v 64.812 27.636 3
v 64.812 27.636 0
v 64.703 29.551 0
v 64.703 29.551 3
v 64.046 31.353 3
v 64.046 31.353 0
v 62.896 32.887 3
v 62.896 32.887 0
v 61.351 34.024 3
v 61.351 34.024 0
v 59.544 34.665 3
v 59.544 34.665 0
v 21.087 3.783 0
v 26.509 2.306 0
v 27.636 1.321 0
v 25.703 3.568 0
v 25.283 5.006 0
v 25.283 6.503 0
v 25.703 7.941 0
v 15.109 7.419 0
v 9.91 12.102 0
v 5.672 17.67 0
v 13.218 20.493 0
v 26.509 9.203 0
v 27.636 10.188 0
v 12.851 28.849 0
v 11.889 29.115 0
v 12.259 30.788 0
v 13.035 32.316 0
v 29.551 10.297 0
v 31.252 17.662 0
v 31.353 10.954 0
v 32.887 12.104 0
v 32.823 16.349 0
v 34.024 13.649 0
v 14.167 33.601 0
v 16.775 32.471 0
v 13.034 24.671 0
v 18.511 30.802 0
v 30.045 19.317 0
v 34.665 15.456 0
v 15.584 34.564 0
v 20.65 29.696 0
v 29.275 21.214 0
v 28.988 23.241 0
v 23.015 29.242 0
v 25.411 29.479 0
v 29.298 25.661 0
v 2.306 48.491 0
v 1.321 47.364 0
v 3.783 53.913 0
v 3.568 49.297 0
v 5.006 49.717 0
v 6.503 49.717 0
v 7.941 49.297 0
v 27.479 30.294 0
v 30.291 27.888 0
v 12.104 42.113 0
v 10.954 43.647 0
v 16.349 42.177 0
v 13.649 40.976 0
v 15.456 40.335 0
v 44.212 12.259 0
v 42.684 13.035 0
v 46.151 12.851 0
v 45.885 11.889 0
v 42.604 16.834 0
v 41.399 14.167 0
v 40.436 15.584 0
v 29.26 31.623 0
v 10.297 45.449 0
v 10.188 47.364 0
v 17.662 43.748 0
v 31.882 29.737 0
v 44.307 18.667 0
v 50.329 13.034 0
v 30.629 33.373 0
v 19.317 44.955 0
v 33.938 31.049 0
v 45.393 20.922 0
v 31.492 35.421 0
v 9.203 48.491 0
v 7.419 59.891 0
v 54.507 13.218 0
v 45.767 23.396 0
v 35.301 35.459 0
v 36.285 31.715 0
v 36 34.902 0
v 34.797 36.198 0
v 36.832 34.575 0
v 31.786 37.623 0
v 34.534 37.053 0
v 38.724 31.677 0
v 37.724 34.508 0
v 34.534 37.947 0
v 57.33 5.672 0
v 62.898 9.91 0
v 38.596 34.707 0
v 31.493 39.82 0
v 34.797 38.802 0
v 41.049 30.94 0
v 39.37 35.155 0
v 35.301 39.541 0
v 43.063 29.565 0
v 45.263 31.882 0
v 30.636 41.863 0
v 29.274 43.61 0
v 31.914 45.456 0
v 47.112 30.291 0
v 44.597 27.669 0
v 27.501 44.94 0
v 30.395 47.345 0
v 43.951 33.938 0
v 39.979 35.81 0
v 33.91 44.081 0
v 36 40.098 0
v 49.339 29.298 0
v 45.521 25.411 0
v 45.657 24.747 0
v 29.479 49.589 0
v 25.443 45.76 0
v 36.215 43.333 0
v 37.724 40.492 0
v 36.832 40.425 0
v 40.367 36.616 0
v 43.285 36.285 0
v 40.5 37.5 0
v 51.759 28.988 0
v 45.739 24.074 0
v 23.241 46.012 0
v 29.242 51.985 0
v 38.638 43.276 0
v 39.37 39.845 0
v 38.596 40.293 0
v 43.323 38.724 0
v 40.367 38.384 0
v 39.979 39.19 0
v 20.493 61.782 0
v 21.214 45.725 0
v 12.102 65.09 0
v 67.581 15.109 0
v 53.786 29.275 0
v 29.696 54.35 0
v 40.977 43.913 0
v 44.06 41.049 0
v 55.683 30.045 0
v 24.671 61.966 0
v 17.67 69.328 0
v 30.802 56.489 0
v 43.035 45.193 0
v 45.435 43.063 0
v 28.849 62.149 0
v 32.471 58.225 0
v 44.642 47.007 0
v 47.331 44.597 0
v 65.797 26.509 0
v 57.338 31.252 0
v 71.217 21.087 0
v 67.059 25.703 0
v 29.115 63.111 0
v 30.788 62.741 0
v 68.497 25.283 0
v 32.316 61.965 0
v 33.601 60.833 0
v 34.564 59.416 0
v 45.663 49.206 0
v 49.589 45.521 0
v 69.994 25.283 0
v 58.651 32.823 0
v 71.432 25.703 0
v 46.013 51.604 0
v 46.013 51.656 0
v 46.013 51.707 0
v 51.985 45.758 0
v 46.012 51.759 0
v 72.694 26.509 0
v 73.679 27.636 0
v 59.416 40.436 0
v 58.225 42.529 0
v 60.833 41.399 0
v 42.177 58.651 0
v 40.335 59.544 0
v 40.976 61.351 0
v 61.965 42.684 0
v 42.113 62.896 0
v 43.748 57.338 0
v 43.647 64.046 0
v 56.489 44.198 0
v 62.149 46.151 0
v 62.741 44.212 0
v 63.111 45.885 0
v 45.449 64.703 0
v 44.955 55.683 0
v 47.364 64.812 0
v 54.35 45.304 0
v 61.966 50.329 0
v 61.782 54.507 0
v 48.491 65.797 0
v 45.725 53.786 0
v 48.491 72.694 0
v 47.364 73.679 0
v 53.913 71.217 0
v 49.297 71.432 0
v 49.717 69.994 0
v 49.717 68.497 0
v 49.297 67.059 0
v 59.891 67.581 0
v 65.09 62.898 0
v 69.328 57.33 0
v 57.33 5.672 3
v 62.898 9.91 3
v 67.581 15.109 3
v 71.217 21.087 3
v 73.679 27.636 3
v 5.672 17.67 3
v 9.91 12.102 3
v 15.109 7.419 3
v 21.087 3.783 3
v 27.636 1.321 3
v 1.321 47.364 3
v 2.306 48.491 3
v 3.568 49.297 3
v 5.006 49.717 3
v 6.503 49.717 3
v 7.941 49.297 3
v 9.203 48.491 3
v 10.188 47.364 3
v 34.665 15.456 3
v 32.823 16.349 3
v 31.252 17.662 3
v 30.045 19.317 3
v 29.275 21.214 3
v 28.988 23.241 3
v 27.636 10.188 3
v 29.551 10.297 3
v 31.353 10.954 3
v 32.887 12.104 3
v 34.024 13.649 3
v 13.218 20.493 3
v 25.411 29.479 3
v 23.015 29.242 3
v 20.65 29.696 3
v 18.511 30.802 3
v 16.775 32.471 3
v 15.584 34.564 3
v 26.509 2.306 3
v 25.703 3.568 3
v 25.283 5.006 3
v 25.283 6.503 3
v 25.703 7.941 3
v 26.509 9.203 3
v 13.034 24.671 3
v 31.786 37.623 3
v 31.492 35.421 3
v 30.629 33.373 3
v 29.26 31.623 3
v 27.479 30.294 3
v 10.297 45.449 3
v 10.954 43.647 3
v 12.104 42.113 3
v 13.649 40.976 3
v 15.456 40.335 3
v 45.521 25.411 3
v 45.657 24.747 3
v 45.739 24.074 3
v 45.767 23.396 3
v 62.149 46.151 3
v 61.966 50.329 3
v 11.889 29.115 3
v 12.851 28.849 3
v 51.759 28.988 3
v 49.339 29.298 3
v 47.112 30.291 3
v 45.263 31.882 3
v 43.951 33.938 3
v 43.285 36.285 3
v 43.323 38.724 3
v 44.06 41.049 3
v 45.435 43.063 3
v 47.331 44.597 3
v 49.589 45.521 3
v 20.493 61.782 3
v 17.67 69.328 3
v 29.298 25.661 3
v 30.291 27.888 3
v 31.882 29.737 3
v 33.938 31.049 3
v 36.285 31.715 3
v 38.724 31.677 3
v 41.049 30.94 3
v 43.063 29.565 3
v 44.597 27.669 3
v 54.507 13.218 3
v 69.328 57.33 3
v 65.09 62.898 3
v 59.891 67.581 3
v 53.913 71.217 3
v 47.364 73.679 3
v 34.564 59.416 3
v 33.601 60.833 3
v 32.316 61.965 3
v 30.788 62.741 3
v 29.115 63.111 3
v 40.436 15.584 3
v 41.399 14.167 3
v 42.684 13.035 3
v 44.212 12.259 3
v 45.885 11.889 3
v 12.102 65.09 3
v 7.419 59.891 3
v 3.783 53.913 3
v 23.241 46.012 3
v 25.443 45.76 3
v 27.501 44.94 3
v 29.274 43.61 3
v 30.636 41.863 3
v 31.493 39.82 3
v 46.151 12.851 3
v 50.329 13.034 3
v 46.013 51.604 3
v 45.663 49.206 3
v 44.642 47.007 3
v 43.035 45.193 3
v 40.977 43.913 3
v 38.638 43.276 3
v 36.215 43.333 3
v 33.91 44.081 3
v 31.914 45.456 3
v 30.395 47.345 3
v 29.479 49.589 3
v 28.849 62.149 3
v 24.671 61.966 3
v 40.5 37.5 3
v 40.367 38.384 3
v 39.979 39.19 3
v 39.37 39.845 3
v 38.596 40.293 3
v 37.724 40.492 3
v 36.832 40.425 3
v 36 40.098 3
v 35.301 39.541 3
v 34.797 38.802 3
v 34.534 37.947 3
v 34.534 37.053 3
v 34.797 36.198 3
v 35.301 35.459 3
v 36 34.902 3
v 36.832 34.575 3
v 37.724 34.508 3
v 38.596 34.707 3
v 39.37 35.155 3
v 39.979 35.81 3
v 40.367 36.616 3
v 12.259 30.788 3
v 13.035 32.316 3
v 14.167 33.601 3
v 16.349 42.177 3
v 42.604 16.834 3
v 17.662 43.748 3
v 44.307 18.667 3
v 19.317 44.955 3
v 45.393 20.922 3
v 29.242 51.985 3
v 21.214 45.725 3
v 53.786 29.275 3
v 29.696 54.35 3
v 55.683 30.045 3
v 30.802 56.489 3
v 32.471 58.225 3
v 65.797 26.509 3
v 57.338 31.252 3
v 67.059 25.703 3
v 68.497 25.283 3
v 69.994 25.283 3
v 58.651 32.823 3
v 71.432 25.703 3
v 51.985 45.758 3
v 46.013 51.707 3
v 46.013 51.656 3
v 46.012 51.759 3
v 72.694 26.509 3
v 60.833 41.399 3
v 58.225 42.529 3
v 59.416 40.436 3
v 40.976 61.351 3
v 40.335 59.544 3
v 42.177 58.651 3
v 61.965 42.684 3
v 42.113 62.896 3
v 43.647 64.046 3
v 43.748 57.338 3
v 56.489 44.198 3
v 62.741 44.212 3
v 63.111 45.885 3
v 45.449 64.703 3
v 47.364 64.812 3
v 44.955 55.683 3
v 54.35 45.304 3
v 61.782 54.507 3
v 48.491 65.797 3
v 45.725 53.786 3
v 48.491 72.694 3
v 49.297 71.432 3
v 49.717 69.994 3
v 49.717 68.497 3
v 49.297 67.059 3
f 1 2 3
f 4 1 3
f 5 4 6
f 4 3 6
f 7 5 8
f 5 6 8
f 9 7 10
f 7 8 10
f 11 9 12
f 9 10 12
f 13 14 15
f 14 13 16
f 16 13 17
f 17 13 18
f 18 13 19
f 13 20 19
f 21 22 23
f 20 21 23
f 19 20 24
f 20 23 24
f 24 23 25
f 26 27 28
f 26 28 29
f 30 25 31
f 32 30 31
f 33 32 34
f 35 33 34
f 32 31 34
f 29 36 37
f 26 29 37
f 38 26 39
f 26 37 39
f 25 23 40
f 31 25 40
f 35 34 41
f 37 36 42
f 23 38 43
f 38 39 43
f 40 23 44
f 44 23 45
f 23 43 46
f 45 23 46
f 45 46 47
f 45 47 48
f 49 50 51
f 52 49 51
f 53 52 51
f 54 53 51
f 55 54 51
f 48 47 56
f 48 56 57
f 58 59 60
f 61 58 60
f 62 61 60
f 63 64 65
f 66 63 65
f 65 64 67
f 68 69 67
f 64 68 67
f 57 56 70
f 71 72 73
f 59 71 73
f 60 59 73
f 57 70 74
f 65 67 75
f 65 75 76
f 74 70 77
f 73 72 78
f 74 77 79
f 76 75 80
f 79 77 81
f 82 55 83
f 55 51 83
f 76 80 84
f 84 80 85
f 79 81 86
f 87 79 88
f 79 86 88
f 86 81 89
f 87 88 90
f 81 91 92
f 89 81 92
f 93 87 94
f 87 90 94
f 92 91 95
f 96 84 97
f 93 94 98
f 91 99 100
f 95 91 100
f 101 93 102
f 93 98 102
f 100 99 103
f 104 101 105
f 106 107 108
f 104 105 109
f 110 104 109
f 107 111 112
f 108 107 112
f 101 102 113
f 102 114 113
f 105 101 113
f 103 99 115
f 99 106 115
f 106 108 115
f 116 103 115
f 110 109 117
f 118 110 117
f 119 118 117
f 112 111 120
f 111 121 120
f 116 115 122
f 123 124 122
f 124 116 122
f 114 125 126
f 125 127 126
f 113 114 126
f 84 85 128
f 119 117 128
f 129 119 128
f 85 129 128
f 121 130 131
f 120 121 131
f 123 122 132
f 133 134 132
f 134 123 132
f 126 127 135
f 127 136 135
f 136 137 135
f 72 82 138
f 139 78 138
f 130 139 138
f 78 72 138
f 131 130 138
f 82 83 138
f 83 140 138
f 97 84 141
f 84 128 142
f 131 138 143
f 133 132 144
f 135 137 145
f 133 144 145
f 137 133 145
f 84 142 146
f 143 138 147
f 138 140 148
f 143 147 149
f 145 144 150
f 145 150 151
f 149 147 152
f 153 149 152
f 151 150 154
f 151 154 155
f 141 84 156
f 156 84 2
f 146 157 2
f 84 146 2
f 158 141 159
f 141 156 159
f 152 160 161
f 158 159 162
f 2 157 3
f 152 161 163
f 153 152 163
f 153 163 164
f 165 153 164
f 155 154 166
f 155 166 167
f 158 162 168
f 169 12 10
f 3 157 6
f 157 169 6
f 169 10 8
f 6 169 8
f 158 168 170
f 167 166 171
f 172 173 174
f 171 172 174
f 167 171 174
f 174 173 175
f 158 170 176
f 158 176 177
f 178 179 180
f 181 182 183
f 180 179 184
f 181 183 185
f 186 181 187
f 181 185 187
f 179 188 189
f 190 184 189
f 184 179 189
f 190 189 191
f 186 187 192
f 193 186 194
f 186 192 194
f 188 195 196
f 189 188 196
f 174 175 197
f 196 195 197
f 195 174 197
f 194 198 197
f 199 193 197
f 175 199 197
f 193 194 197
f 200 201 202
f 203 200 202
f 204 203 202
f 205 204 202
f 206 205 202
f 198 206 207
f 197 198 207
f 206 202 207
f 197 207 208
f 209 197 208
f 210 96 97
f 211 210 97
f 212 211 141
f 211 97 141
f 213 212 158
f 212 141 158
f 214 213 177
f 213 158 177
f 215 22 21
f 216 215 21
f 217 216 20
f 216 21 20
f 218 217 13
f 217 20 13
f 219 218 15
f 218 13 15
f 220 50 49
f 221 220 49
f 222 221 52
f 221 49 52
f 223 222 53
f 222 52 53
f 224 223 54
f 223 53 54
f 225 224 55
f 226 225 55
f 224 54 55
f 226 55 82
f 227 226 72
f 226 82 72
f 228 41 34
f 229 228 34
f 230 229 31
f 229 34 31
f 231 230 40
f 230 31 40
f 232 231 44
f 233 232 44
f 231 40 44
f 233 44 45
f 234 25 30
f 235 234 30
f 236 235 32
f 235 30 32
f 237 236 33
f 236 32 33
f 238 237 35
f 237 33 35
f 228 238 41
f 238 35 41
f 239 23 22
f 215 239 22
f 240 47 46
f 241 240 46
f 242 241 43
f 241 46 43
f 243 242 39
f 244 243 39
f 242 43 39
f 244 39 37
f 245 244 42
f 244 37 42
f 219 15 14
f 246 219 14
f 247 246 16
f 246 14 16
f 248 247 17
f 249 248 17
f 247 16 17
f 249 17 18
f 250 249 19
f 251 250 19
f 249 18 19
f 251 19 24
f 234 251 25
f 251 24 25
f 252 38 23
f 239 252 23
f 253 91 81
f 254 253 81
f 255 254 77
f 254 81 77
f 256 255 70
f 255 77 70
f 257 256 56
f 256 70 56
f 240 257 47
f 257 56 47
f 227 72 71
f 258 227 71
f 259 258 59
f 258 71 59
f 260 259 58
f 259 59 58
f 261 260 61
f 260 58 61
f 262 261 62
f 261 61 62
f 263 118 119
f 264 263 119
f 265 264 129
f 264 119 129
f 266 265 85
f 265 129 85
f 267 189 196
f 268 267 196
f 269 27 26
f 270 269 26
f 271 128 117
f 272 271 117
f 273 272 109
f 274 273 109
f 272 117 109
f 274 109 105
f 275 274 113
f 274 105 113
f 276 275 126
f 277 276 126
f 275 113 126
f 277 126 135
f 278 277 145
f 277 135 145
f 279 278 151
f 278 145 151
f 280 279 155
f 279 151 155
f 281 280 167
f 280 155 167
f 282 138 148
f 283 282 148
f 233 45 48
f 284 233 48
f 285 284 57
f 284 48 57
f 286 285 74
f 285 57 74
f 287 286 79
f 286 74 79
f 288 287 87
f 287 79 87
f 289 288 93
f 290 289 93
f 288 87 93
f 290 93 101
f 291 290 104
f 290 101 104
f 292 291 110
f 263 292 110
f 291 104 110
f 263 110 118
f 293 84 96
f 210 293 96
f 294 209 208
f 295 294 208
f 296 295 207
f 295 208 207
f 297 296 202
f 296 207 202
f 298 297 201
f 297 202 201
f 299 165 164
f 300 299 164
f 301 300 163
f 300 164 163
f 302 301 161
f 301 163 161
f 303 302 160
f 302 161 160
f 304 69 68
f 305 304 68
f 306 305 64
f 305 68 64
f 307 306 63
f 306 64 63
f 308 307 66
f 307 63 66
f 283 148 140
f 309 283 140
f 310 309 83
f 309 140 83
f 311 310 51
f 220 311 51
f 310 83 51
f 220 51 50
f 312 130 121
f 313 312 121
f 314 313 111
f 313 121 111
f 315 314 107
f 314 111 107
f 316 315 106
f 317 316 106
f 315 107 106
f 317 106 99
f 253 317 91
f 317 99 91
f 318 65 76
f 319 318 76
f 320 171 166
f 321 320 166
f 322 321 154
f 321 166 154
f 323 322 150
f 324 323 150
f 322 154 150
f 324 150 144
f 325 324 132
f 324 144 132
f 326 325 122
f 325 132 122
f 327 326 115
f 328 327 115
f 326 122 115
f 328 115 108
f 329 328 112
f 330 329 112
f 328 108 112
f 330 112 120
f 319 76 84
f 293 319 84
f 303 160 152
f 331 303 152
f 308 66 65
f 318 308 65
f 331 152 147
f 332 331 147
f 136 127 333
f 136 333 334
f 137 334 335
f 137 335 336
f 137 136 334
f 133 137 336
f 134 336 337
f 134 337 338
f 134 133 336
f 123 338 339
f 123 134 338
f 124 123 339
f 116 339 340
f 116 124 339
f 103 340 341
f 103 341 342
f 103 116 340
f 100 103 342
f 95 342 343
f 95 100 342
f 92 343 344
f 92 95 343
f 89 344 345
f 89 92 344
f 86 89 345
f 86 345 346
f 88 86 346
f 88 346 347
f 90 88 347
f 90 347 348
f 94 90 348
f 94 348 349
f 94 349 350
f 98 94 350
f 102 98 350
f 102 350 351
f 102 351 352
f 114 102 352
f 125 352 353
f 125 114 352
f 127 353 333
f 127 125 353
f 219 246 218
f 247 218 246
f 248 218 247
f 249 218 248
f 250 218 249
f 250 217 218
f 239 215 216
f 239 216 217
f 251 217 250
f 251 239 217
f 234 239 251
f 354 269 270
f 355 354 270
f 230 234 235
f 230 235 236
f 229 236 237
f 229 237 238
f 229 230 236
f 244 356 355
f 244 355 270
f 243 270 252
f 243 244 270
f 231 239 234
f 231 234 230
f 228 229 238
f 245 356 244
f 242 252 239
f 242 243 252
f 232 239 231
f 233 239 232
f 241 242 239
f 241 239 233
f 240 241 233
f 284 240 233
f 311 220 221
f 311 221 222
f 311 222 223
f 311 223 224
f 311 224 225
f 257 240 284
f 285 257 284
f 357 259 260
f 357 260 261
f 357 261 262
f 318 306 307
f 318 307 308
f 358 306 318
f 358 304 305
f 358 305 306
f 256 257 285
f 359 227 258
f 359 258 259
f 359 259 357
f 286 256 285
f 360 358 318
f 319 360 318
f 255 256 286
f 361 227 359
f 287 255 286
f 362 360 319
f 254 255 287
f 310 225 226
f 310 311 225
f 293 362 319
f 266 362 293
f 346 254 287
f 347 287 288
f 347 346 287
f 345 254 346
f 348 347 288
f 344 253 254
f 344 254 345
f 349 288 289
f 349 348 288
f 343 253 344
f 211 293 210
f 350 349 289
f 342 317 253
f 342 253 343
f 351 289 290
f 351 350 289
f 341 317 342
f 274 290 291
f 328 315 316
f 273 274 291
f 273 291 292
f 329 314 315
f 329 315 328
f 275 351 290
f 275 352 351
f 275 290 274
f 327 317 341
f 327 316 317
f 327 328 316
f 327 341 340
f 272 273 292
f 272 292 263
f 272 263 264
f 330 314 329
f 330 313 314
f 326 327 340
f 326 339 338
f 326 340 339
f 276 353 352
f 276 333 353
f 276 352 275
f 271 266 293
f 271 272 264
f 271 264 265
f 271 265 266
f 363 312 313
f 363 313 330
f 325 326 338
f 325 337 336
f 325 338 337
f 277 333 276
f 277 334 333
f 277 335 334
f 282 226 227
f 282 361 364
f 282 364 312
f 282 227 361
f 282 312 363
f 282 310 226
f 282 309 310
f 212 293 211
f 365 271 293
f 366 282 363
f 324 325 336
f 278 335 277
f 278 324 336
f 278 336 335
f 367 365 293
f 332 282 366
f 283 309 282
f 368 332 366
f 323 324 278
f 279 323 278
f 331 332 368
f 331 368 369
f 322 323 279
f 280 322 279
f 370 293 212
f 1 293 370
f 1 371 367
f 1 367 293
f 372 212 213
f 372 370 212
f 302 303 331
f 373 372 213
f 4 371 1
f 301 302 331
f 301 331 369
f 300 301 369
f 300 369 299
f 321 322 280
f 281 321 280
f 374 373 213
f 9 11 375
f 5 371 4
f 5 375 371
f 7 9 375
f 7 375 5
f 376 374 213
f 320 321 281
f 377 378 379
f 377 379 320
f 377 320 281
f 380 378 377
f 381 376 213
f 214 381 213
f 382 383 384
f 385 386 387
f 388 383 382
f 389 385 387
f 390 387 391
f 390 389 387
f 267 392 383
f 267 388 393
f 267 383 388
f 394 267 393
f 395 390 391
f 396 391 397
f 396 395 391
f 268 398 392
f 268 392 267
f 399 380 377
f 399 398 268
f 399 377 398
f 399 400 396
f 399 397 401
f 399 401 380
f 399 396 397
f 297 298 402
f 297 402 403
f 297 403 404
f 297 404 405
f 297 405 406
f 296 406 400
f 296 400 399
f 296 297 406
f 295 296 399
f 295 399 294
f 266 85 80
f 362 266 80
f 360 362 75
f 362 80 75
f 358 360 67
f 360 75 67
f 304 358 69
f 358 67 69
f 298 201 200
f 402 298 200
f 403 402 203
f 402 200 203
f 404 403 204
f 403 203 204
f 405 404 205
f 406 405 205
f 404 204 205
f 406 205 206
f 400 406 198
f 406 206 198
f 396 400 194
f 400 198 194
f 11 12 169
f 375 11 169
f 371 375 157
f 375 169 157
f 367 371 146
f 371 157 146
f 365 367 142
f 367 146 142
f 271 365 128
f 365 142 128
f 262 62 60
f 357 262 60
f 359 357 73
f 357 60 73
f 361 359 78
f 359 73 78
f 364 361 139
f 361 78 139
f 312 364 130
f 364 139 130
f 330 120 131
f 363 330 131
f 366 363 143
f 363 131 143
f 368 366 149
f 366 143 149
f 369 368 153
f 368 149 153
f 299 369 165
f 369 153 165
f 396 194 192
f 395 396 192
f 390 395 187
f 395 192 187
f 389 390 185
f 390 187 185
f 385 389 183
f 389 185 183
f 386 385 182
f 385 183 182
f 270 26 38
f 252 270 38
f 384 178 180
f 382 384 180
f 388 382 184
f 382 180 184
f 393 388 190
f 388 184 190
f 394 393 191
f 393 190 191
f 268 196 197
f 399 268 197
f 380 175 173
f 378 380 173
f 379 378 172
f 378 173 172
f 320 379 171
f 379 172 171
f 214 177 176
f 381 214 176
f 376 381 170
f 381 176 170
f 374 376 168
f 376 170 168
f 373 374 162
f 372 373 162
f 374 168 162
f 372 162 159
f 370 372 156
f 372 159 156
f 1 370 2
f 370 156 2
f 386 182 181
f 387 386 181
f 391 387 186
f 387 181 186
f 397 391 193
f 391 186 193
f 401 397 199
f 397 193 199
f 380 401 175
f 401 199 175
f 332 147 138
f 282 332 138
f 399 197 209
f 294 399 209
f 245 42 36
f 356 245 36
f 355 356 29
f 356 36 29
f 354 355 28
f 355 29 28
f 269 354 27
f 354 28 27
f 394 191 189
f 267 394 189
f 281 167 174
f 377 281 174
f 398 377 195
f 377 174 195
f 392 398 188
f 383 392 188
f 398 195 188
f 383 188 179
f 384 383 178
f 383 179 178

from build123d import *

# Parameters (mm, degrees)
F0_R     = 3
F1_DEPTH = 3


with BuildPart() as f1:
    # F0 (on Top) → F1 (new body)
    with BuildSketch(Plane.XY):
        with BuildLine():
            ThreePointArc((57.3301127781, 5.6720778685), (67.5811295865, 15.1085810454), (73.679486557, 27.6361897588))
            ThreePointArc((73.679486557, 27.6361897588), (69.2456728253, 25.2293463411), (64.8118590936, 27.6361897588))
            ThreePointArc((64.8118590936, 27.6361897588), (63.5273534072, 32.1621670241), (59.5437049903, 34.6651593043))
            ThreePointArc((59.5437049903, 34.6651593043), (56.5473999136, 30.5977037223), (51.7587434047, 28.9881050568))
            ThreePointArc((51.7587434047, 28.9881050568), (43.2853466758, 36.2848022119), (49.588750459, 45.5209996029))
            ThreePointArc((49.588750459, 45.5209996029), (55.4595817481, 44.828212266), (59.4162546646, 40.4360199032))
            ThreePointArc((59.4162546646, 40.4360199032), (61.9654848992, 42.6842952192), (63.1107981169, 45.8845411972))
            Line((63.1107981169, 45.8845411972), (62.1492189347, 46.1509661226))
            Line((62.1492189347, 46.1509661226), (61.9658155367, 50.3289483488))
            Line((61.9658155367, 50.3289483488), (61.7824121386, 54.5069305749))
            Line((61.7824121386, 54.5069305749), (69.3279221315, 57.3301127781))
            ThreePointArc((69.3279221315, 57.3301127781), (59.8914189546, 67.5811295865), (47.3638102412, 73.679486557))
            ThreePointArc((47.3638102412, 73.679486557), (49.7706536589, 69.2456728253), (47.3638102412, 64.8118590936))
            ThreePointArc((47.3638102412, 64.8118590936), (42.8378329759, 63.5273534072), (40.3348406957, 59.5437049903))
            ThreePointArc((40.3348406957, 59.5437049903), (44.4022962777, 56.5473999136), (46.0118949432, 51.7587434047))
            ThreePointArc((46.0118949432, 51.7587434047), (46.012965743, 51.6813590294), (46.0133226864, 51.603968069))
            ThreePointArc((46.0133226864, 51.603968069), (38.6384185061, 43.2756291652), (29.4790003971, 49.588750459))
            ThreePointArc((29.4790003971, 49.588750459), (30.171787734, 55.4595817481), (34.5639800968, 59.4162546646))
            ThreePointArc((34.5639800968, 59.4162546646), (32.3157047808, 61.9654848992), (29.1154588028, 63.1107981169))
            Line((29.1154588028, 63.1107981169), (28.8490338774, 62.1492189347))
            Line((28.8490338774, 62.1492189347), (24.6710516512, 61.9658155367))
            Line((24.6710516512, 61.9658155367), (20.4930694251, 61.7824121386))
            Line((20.4930694251, 61.7824121386), (17.6698872219, 69.3279221315))
            ThreePointArc((17.6698872219, 69.3279221315), (7.4188704135, 59.8914189546), (1.320513443, 47.3638102412))
            ThreePointArc((1.320513443, 47.3638102412), (5.7543271747, 49.7706536589), (10.1881409064, 47.3638102412))
            ThreePointArc((10.1881409064, 47.3638102412), (11.4726465928, 42.8378329759), (15.4562950097, 40.3348406957))
            ThreePointArc((15.4562950097, 40.3348406957), (18.4526000864, 44.4022962777), (23.2412565953, 46.0118949432))
            ThreePointArc((23.2412565953, 46.0118949432), (29.2736601064, 43.6104288236), (31.786001315, 37.6233533025))
            ThreePointArc((31.786001315, 37.6233533025), (30.0028163347, 32.4520878764), (25.411249541, 29.4790003971))
            ThreePointArc((25.411249541, 29.4790003971), (19.5404182519, 30.171787734), (15.5837453354, 34.5639800968))
            ThreePointArc((15.5837453354, 34.5639800968), (13.0345151008, 32.3157047808), (11.8892018831, 29.1154588028))
            Line((11.8892018831, 29.1154588028), (12.8507810653, 28.8490338774))
            Line((12.8507810653, 28.8490338774), (13.0341844633, 24.6710516512))
            Line((13.0341844633, 24.6710516512), (13.2175878614, 20.4930694251))
            Line((13.2175878614, 20.4930694251), (5.6720778685, 17.6698872219))
            ThreePointArc((5.6720778685, 17.6698872219), (15.1085810454, 7.4188704135), (27.6361897588, 1.320513443))
            ThreePointArc((27.6361897588, 1.320513443), (25.2293463411, 5.7543271747), (27.6361897588, 10.1881409064))
            ThreePointArc((27.6361897588, 10.1881409064), (32.1621670241, 11.4726465928), (34.6651593043, 15.4562950097))
            ThreePointArc((34.6651593043, 15.4562950097), (30.5977037223, 18.4526000864), (28.9881050568, 23.2412565953))
            ThreePointArc((28.9881050568, 23.2412565953), (36.2848022119, 31.7146533242), (45.5209996029, 25.411249541))
            ThreePointArc((45.5209996029, 25.411249541), (45.7049856013, 24.4110971346), (45.7666160814, 23.396031931))
            ThreePointArc((45.7666160814, 23.396031931), (44.3070014429, 18.6672086771), (40.4360199032, 15.5837453354))
            ThreePointArc((40.4360199032, 15.5837453354), (42.6842952192, 13.0345151008), (45.8845411972, 11.8892018831))
            Line((45.8845411972, 11.8892018831), (46.1509661226, 12.8507810653))
            Line((46.1509661226, 12.8507810653), (50.3289483488, 13.0341844633))
            Line((50.3289483488, 13.0341844633), (54.5069305749, 13.2175878614))
            Line((54.5069305749, 13.2175878614), (57.3301127781, 5.6720778685))
        make_face()
        with Locations((37.5, 37.5)):
            Circle(F0_R, mode=Mode.SUBTRACT)
    extrude(amount=F1_DEPTH)


solid = f1.part
